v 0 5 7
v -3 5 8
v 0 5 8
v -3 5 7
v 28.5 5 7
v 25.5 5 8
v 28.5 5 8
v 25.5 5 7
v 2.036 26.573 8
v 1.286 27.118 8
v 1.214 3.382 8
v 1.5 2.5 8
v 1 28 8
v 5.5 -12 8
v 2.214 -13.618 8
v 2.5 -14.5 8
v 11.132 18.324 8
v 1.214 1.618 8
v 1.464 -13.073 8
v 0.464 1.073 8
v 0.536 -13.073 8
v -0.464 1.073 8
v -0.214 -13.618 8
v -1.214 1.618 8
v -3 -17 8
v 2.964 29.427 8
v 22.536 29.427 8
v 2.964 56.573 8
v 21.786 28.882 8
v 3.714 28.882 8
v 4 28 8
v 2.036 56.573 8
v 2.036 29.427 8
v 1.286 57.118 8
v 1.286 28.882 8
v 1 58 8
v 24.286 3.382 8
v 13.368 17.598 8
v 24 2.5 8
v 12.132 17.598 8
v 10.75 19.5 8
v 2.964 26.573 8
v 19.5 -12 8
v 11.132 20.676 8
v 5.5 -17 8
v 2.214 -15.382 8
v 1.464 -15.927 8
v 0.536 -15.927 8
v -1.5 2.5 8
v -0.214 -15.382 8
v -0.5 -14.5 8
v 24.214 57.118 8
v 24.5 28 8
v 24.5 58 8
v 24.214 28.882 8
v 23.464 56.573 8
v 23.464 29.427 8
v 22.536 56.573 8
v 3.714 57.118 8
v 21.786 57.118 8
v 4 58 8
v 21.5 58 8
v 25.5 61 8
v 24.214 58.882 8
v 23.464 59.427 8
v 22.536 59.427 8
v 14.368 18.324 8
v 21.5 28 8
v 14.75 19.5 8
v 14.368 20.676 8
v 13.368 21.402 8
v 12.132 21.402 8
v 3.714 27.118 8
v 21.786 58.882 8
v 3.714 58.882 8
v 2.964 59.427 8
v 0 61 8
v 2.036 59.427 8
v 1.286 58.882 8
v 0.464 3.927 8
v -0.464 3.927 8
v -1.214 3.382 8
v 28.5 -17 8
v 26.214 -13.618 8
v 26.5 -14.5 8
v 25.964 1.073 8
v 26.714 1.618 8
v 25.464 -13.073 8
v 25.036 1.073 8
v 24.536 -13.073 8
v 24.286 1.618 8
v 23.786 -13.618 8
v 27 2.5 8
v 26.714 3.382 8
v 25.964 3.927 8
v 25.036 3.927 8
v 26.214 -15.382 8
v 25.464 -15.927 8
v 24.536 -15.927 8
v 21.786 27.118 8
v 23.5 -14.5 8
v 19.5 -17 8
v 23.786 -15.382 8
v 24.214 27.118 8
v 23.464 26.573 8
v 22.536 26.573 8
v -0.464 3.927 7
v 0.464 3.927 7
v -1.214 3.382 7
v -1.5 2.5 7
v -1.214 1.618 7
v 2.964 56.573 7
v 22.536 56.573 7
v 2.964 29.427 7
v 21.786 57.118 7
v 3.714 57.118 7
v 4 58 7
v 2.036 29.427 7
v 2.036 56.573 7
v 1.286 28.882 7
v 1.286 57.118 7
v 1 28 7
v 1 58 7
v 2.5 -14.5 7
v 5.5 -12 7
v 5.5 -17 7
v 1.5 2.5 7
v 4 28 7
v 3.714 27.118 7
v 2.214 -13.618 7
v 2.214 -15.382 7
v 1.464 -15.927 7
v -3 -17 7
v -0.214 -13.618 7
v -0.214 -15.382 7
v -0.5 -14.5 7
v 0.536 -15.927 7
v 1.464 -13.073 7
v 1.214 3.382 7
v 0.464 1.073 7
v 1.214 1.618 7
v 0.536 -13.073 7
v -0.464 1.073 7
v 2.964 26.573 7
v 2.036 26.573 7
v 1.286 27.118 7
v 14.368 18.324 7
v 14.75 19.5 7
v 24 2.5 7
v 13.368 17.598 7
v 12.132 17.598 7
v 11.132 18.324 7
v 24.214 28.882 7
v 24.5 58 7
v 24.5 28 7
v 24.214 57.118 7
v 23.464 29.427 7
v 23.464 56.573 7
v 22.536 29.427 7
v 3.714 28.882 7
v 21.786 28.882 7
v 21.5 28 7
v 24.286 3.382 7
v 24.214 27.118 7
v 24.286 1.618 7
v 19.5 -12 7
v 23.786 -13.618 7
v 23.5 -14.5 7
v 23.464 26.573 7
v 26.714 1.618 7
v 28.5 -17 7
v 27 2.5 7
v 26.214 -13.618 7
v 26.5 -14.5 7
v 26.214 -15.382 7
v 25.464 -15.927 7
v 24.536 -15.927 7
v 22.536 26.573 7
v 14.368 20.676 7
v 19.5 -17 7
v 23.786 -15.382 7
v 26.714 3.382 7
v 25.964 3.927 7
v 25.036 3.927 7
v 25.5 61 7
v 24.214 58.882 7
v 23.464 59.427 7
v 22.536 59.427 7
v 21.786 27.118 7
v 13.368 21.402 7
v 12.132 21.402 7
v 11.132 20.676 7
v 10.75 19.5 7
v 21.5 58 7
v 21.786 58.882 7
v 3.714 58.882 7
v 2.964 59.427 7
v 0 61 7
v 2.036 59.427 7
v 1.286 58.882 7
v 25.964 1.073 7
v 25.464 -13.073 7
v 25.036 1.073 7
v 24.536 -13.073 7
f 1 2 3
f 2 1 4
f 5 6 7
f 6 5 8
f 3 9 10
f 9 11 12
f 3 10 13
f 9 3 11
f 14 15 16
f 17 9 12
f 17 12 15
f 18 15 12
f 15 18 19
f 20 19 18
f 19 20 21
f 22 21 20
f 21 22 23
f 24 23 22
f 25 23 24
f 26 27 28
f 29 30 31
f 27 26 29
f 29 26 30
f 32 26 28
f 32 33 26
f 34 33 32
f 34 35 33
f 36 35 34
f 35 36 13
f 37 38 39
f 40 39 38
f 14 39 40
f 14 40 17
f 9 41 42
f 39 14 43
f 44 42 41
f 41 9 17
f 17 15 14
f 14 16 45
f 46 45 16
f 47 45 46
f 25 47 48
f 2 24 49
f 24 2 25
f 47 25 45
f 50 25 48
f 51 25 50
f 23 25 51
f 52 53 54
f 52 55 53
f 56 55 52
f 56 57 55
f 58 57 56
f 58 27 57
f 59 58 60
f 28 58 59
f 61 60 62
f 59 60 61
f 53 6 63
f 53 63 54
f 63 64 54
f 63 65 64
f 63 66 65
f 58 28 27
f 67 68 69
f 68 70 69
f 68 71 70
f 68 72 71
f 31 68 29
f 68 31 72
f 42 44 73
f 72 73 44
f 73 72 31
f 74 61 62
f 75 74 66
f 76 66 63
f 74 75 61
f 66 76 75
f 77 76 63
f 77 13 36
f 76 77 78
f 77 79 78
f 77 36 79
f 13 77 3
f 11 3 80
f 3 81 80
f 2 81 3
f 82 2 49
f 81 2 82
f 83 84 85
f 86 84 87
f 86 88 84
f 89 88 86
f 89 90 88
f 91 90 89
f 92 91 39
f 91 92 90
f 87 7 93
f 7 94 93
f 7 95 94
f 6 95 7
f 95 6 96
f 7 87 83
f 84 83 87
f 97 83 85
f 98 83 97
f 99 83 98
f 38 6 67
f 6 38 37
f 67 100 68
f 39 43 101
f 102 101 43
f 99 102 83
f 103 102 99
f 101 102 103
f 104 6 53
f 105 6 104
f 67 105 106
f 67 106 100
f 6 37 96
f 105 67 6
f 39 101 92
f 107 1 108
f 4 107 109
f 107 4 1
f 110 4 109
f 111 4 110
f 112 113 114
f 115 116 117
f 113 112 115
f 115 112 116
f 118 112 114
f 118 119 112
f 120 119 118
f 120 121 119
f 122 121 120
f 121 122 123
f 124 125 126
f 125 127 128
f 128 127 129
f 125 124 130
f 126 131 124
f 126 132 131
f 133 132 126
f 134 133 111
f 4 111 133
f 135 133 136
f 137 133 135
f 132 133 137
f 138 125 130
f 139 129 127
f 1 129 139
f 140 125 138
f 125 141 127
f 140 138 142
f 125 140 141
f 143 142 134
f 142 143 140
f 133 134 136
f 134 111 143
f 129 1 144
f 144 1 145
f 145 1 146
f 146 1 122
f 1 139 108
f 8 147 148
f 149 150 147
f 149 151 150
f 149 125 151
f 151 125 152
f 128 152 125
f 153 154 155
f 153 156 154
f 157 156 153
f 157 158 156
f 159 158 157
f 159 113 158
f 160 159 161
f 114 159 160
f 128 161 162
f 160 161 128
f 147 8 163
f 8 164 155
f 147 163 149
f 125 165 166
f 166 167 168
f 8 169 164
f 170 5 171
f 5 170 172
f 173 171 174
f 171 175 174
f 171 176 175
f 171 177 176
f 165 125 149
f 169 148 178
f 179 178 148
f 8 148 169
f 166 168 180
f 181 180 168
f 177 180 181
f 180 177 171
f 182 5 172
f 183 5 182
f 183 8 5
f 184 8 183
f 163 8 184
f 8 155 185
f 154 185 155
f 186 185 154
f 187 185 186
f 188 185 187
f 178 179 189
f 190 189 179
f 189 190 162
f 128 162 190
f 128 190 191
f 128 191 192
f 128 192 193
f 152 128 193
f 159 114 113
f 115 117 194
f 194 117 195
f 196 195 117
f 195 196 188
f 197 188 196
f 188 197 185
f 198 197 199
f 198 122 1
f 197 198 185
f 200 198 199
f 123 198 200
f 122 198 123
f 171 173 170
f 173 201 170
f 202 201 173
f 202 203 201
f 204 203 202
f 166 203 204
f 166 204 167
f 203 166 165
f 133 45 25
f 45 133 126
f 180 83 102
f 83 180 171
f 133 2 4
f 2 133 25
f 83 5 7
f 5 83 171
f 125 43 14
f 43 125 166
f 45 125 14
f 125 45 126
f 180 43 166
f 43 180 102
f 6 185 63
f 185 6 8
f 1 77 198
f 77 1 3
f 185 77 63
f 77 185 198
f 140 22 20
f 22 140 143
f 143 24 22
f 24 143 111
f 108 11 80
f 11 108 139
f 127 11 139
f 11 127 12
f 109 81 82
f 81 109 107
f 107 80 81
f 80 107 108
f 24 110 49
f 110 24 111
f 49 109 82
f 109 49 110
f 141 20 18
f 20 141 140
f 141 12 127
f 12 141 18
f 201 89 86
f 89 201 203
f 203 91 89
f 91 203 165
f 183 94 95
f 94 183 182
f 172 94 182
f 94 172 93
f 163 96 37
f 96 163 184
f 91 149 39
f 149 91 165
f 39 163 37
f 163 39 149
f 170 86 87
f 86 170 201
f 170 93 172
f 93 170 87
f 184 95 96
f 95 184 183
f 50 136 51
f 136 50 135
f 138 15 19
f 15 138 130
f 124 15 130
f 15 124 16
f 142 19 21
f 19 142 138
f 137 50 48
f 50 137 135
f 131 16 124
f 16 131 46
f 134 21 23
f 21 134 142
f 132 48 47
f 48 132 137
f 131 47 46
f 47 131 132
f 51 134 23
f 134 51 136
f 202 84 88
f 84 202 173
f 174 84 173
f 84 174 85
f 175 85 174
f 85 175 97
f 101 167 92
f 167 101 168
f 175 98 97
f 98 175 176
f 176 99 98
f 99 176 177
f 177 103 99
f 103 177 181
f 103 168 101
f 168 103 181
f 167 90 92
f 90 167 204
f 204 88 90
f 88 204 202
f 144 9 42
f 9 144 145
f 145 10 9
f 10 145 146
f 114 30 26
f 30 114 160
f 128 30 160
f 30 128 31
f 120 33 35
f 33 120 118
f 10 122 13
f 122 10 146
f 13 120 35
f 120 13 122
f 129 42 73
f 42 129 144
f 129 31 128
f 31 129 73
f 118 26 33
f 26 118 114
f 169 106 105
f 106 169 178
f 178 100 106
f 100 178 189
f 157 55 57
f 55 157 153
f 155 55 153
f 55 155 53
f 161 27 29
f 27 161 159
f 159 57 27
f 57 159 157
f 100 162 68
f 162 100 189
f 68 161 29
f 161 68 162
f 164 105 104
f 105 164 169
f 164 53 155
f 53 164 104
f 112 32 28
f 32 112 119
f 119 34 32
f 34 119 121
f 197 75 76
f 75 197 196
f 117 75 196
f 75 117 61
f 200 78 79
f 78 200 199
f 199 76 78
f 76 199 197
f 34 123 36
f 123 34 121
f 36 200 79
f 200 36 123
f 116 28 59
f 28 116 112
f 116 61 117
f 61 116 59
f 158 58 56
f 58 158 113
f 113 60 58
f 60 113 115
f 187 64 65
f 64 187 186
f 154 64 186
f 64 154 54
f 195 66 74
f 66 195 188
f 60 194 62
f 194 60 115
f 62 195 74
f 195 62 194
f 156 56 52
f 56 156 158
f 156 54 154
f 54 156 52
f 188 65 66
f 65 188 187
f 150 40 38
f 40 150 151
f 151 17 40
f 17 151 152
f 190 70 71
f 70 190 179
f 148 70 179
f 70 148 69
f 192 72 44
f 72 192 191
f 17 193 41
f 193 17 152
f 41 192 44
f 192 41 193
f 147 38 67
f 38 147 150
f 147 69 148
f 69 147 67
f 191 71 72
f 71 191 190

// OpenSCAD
main_board_width=15.5; // 15.5
main_board_length=51; // 50.04
main_board_height=5;

musb_width=12; // 11.45
musb_length=21.5; // 21.15
musb_height=5; // 4.35

musb_connector_width=5; // 6
musb_connector_length=14; // musb connector opening, 8
musb_connector_height=musb_height+2; // 3.1

wall_thickness=5;
bottom_thickness=1;

module main_board() {
  difference() {
    cube([main_board_width+(wall_thickness*2), main_board_length+(wall_thickness*2), main_board_height+bottom_thickness]);
    translate([wall_thickness,wall_thickness,bottom_thickness]) cube([main_board_width, main_board_length, main_board_height]);
    
  }
}

module musb_board() {
  difference() {
    cube([musb_width+(wall_thickness*2), musb_length+(wall_thickness*2), musb_height+bottom_thickness]);
    translate([wall_thickness,wall_thickness,bottom_thickness]) cube([musb_width, musb_length, musb_height]);
    
  }
}

module musb_connector() {
  cube([musb_connector_width, musb_connector_length, musb_connector_height]);
}

module musb_module() {
  difference() {
    musb_board();
    translate([
      0,
      9, // usb connector opening
      musb_height-musb_connector_height+bottom_thickness
    ]) musb_connector();
  }
}

module screw_hole(d=3) {
  cylinder(h=main_board_height+bottom_thickness, d=d, center=false, $fn=10);
}

module screw_holes(d=3) {
  translate([0,2.5,0]) screw_hole(d=d);
  translate([25.5,2.5,0]) screw_hole(d=d);

  translate([1,-14.5,0]) screw_hole(d=d);
  translate([25,-14.5,0]) screw_hole(d=d);

  translate([2.5,28,0]) screw_hole(d=d);
  translate([23,28,0]) screw_hole(d=d);

  translate([2.5,58,0]) screw_hole(d=d);
  translate([23,58,0]) screw_hole(d=d);
}

module complete_lower() {
  difference() {
    union() {
      main_board();
      translate([
        musb_length+(wall_thickness)+2,
        -musb_width-(wall_thickness),
        0
      ]) rotate([0,0,90]) musb_module();
    }
    // clear wall between both containers
    translate([
      wall_thickness,
      0,
      bottom_thickness+1 // lip to hold board in place
    ]) cube([main_board_width,wall_thickness*2,main_board_height]);

    screw_holes();
  }

  // raise floor to hold musb board better
  translate([
    wall_thickness*1.5,
    -musb_width/2,
    0
  ]) cube([musb_length/2,musb_width/4,musb_connector_height-3]);
}

module main_lid() {
  cube([main_board_width+(wall_thickness*2), main_board_length+(wall_thickness*2), bottom_thickness]);
}

module musb_lid() {
  difference() {
    cube([musb_width+(wall_thickness*2), musb_length+(wall_thickness*2), bottom_thickness]);
    translate([
      0,
      9, // usb connector opening
      musb_height-musb_connector_height+bottom_thickness
    ]) musb_connector();
  }
}

module complete_lid() {
  difference() {
    union() {
      main_lid();
      translate([
        musb_length+(wall_thickness)+2,
        -musb_width-(wall_thickness),
        0
      ]) rotate([0,0,90]) musb_lid();
    }
    screw_holes();
    // led hole
    translate([main_board_width/2+wall_thickness,19.5,0]) screw_hole(d=4);
  }
}

// complete_lower();
translate([0,0,7]) complete_lid();
